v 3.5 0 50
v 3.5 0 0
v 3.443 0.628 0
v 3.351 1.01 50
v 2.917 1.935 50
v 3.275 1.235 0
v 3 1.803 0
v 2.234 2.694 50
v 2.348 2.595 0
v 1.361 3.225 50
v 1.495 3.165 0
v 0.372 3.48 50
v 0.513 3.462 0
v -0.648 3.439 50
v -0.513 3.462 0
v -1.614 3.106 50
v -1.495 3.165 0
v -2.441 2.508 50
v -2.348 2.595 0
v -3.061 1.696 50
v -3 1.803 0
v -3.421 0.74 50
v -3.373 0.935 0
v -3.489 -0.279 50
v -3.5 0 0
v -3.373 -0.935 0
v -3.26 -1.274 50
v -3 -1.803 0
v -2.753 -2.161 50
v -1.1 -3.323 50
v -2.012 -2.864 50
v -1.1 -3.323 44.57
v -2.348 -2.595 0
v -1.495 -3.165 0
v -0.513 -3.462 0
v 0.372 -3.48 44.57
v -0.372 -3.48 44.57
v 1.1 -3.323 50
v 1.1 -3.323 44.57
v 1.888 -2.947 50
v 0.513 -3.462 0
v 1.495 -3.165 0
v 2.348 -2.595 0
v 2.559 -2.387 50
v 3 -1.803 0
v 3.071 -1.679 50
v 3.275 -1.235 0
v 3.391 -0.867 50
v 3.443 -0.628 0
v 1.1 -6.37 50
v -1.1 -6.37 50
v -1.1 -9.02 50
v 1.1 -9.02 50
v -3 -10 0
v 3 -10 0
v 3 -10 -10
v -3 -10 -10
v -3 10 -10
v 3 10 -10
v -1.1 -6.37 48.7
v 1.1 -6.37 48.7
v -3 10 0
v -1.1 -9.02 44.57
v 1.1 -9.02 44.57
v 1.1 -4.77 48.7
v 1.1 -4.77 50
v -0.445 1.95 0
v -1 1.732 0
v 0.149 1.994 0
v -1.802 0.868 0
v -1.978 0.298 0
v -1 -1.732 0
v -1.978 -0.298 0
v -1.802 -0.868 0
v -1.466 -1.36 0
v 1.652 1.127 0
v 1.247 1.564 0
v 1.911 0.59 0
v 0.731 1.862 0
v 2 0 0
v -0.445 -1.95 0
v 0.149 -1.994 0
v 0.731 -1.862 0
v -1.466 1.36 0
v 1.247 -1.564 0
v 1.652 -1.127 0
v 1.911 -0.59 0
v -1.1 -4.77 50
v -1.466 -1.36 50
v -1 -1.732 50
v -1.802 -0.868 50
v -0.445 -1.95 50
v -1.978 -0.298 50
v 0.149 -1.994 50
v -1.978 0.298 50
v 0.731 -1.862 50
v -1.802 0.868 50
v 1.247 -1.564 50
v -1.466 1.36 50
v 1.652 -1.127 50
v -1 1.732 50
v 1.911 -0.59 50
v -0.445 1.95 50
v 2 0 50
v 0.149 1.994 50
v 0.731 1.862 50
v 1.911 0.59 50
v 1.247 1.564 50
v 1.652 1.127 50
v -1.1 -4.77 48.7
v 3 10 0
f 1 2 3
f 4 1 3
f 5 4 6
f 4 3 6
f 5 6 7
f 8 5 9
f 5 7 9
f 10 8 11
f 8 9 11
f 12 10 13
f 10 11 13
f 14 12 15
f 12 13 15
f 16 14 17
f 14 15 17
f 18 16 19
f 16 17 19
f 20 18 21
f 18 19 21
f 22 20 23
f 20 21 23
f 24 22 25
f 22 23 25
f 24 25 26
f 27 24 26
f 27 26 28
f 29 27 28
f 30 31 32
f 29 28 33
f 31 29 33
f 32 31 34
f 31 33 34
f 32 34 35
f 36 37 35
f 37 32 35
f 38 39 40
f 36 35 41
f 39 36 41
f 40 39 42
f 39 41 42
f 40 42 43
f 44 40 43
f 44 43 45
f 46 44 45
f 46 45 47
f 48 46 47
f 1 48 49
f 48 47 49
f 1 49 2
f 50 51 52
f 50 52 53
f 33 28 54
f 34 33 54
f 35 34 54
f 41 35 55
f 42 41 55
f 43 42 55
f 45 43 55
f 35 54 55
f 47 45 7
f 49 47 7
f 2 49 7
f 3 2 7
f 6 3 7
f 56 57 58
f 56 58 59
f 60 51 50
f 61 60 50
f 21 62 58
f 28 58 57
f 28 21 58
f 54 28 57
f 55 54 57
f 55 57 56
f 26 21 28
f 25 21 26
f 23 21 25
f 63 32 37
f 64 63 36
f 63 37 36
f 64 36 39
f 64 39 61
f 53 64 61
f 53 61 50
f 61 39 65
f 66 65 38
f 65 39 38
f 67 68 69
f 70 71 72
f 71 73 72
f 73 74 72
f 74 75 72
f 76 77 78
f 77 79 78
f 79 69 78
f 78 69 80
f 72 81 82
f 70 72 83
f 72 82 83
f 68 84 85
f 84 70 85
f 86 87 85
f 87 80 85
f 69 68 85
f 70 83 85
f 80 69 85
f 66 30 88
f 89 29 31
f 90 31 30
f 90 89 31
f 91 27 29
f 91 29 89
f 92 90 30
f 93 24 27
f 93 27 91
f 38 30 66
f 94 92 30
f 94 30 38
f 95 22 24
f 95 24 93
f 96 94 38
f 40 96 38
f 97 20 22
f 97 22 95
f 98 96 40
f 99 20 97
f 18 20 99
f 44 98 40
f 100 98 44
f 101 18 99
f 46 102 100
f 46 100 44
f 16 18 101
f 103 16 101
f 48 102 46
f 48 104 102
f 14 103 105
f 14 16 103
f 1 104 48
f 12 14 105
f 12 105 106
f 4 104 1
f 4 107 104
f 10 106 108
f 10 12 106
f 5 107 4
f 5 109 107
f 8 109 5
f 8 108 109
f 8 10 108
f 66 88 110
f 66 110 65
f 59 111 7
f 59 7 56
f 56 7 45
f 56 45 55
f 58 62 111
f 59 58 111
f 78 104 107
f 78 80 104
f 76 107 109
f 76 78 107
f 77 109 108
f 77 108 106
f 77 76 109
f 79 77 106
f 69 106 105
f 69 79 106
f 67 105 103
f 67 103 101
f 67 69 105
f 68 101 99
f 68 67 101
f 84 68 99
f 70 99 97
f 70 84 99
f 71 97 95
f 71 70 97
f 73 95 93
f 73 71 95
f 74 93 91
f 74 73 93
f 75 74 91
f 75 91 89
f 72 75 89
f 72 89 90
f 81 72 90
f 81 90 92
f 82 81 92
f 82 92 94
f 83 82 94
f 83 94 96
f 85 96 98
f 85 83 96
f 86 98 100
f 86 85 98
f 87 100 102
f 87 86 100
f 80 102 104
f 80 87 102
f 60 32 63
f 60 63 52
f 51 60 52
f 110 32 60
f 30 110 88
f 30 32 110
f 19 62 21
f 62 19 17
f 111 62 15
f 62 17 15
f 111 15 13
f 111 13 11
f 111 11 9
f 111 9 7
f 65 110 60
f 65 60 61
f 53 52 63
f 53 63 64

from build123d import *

# Parameters (mm, degrees)
F0_R          = 3.5
F0_R_2        = 2
F1_DEPTH      = 50
F2_W          = 2.2
F2_H          = 5.43
F3_DEPTH      = 9.02
F4_END_RADIUS = 2
F4_REACH      = 14.8797455995
F5_W          = 2.2
F5_H          = 1.6
F6_DEPTH      = 1.3
F7_W          = 6
F7_H          = 20
F8_DEPTH      = 10


with BuildPart() as f1:
    # F0 (on Top) → F1 (new body)
    with BuildSketch(Plane.XY):
        Circle(F0_R)
        Circle(F0_R_2, mode=Mode.SUBTRACT)
    extrude(amount=F1_DEPTH)

    # F2 (on Front) → F3 (join)
    with BuildSketch(Plane.XZ):
        with Locations((0, 47.285)):
            Rectangle(F2_W, F2_H)
    extrude(amount=F3_DEPTH)

    f4_end = (Plane(origin=(0, 0, 25), x_dir=(-1, 0, 0), z_dir=(0, 0, -1)) * Cylinder(F4_END_RADIUS, 133.7931472917, mode=Mode.PRIVATE)).faces().sort_by_distance((-2, 0, 25))[0]
    # F2 (on Front) → F4 (cut, up to the whole of a round face its end follows)
    with BuildSketch(Plane.XZ):
        with Locations((0, 47.285)):
            Rectangle(F2_W, F2_H)
    f4_long = extrude(amount=F4_REACH, mode=Mode.PRIVATE)
    add(split(f4_long, bisect_by=f4_end, keep=Keep.BOTTOM, mode=Mode.PRIVATE), mode=Mode.SUBTRACT)

    # F5 (on face) → F6 (cut)
    with BuildSketch(Plane.XY.offset(50)):
        with Locations((0, -5.57)):
            Rectangle(F5_W, F5_H)
    extrude(amount=-F6_DEPTH, mode=Mode.SUBTRACT)

    # F7 (on face) → F8 (join)
    with BuildSketch(Plane(origin=(0, 0, 0), x_dir=(1, 0, 0), z_dir=(0, 0, -1))):
        Rectangle(F7_W, F7_H)
    extrude(amount=F8_DEPTH)


solid = f1.part
